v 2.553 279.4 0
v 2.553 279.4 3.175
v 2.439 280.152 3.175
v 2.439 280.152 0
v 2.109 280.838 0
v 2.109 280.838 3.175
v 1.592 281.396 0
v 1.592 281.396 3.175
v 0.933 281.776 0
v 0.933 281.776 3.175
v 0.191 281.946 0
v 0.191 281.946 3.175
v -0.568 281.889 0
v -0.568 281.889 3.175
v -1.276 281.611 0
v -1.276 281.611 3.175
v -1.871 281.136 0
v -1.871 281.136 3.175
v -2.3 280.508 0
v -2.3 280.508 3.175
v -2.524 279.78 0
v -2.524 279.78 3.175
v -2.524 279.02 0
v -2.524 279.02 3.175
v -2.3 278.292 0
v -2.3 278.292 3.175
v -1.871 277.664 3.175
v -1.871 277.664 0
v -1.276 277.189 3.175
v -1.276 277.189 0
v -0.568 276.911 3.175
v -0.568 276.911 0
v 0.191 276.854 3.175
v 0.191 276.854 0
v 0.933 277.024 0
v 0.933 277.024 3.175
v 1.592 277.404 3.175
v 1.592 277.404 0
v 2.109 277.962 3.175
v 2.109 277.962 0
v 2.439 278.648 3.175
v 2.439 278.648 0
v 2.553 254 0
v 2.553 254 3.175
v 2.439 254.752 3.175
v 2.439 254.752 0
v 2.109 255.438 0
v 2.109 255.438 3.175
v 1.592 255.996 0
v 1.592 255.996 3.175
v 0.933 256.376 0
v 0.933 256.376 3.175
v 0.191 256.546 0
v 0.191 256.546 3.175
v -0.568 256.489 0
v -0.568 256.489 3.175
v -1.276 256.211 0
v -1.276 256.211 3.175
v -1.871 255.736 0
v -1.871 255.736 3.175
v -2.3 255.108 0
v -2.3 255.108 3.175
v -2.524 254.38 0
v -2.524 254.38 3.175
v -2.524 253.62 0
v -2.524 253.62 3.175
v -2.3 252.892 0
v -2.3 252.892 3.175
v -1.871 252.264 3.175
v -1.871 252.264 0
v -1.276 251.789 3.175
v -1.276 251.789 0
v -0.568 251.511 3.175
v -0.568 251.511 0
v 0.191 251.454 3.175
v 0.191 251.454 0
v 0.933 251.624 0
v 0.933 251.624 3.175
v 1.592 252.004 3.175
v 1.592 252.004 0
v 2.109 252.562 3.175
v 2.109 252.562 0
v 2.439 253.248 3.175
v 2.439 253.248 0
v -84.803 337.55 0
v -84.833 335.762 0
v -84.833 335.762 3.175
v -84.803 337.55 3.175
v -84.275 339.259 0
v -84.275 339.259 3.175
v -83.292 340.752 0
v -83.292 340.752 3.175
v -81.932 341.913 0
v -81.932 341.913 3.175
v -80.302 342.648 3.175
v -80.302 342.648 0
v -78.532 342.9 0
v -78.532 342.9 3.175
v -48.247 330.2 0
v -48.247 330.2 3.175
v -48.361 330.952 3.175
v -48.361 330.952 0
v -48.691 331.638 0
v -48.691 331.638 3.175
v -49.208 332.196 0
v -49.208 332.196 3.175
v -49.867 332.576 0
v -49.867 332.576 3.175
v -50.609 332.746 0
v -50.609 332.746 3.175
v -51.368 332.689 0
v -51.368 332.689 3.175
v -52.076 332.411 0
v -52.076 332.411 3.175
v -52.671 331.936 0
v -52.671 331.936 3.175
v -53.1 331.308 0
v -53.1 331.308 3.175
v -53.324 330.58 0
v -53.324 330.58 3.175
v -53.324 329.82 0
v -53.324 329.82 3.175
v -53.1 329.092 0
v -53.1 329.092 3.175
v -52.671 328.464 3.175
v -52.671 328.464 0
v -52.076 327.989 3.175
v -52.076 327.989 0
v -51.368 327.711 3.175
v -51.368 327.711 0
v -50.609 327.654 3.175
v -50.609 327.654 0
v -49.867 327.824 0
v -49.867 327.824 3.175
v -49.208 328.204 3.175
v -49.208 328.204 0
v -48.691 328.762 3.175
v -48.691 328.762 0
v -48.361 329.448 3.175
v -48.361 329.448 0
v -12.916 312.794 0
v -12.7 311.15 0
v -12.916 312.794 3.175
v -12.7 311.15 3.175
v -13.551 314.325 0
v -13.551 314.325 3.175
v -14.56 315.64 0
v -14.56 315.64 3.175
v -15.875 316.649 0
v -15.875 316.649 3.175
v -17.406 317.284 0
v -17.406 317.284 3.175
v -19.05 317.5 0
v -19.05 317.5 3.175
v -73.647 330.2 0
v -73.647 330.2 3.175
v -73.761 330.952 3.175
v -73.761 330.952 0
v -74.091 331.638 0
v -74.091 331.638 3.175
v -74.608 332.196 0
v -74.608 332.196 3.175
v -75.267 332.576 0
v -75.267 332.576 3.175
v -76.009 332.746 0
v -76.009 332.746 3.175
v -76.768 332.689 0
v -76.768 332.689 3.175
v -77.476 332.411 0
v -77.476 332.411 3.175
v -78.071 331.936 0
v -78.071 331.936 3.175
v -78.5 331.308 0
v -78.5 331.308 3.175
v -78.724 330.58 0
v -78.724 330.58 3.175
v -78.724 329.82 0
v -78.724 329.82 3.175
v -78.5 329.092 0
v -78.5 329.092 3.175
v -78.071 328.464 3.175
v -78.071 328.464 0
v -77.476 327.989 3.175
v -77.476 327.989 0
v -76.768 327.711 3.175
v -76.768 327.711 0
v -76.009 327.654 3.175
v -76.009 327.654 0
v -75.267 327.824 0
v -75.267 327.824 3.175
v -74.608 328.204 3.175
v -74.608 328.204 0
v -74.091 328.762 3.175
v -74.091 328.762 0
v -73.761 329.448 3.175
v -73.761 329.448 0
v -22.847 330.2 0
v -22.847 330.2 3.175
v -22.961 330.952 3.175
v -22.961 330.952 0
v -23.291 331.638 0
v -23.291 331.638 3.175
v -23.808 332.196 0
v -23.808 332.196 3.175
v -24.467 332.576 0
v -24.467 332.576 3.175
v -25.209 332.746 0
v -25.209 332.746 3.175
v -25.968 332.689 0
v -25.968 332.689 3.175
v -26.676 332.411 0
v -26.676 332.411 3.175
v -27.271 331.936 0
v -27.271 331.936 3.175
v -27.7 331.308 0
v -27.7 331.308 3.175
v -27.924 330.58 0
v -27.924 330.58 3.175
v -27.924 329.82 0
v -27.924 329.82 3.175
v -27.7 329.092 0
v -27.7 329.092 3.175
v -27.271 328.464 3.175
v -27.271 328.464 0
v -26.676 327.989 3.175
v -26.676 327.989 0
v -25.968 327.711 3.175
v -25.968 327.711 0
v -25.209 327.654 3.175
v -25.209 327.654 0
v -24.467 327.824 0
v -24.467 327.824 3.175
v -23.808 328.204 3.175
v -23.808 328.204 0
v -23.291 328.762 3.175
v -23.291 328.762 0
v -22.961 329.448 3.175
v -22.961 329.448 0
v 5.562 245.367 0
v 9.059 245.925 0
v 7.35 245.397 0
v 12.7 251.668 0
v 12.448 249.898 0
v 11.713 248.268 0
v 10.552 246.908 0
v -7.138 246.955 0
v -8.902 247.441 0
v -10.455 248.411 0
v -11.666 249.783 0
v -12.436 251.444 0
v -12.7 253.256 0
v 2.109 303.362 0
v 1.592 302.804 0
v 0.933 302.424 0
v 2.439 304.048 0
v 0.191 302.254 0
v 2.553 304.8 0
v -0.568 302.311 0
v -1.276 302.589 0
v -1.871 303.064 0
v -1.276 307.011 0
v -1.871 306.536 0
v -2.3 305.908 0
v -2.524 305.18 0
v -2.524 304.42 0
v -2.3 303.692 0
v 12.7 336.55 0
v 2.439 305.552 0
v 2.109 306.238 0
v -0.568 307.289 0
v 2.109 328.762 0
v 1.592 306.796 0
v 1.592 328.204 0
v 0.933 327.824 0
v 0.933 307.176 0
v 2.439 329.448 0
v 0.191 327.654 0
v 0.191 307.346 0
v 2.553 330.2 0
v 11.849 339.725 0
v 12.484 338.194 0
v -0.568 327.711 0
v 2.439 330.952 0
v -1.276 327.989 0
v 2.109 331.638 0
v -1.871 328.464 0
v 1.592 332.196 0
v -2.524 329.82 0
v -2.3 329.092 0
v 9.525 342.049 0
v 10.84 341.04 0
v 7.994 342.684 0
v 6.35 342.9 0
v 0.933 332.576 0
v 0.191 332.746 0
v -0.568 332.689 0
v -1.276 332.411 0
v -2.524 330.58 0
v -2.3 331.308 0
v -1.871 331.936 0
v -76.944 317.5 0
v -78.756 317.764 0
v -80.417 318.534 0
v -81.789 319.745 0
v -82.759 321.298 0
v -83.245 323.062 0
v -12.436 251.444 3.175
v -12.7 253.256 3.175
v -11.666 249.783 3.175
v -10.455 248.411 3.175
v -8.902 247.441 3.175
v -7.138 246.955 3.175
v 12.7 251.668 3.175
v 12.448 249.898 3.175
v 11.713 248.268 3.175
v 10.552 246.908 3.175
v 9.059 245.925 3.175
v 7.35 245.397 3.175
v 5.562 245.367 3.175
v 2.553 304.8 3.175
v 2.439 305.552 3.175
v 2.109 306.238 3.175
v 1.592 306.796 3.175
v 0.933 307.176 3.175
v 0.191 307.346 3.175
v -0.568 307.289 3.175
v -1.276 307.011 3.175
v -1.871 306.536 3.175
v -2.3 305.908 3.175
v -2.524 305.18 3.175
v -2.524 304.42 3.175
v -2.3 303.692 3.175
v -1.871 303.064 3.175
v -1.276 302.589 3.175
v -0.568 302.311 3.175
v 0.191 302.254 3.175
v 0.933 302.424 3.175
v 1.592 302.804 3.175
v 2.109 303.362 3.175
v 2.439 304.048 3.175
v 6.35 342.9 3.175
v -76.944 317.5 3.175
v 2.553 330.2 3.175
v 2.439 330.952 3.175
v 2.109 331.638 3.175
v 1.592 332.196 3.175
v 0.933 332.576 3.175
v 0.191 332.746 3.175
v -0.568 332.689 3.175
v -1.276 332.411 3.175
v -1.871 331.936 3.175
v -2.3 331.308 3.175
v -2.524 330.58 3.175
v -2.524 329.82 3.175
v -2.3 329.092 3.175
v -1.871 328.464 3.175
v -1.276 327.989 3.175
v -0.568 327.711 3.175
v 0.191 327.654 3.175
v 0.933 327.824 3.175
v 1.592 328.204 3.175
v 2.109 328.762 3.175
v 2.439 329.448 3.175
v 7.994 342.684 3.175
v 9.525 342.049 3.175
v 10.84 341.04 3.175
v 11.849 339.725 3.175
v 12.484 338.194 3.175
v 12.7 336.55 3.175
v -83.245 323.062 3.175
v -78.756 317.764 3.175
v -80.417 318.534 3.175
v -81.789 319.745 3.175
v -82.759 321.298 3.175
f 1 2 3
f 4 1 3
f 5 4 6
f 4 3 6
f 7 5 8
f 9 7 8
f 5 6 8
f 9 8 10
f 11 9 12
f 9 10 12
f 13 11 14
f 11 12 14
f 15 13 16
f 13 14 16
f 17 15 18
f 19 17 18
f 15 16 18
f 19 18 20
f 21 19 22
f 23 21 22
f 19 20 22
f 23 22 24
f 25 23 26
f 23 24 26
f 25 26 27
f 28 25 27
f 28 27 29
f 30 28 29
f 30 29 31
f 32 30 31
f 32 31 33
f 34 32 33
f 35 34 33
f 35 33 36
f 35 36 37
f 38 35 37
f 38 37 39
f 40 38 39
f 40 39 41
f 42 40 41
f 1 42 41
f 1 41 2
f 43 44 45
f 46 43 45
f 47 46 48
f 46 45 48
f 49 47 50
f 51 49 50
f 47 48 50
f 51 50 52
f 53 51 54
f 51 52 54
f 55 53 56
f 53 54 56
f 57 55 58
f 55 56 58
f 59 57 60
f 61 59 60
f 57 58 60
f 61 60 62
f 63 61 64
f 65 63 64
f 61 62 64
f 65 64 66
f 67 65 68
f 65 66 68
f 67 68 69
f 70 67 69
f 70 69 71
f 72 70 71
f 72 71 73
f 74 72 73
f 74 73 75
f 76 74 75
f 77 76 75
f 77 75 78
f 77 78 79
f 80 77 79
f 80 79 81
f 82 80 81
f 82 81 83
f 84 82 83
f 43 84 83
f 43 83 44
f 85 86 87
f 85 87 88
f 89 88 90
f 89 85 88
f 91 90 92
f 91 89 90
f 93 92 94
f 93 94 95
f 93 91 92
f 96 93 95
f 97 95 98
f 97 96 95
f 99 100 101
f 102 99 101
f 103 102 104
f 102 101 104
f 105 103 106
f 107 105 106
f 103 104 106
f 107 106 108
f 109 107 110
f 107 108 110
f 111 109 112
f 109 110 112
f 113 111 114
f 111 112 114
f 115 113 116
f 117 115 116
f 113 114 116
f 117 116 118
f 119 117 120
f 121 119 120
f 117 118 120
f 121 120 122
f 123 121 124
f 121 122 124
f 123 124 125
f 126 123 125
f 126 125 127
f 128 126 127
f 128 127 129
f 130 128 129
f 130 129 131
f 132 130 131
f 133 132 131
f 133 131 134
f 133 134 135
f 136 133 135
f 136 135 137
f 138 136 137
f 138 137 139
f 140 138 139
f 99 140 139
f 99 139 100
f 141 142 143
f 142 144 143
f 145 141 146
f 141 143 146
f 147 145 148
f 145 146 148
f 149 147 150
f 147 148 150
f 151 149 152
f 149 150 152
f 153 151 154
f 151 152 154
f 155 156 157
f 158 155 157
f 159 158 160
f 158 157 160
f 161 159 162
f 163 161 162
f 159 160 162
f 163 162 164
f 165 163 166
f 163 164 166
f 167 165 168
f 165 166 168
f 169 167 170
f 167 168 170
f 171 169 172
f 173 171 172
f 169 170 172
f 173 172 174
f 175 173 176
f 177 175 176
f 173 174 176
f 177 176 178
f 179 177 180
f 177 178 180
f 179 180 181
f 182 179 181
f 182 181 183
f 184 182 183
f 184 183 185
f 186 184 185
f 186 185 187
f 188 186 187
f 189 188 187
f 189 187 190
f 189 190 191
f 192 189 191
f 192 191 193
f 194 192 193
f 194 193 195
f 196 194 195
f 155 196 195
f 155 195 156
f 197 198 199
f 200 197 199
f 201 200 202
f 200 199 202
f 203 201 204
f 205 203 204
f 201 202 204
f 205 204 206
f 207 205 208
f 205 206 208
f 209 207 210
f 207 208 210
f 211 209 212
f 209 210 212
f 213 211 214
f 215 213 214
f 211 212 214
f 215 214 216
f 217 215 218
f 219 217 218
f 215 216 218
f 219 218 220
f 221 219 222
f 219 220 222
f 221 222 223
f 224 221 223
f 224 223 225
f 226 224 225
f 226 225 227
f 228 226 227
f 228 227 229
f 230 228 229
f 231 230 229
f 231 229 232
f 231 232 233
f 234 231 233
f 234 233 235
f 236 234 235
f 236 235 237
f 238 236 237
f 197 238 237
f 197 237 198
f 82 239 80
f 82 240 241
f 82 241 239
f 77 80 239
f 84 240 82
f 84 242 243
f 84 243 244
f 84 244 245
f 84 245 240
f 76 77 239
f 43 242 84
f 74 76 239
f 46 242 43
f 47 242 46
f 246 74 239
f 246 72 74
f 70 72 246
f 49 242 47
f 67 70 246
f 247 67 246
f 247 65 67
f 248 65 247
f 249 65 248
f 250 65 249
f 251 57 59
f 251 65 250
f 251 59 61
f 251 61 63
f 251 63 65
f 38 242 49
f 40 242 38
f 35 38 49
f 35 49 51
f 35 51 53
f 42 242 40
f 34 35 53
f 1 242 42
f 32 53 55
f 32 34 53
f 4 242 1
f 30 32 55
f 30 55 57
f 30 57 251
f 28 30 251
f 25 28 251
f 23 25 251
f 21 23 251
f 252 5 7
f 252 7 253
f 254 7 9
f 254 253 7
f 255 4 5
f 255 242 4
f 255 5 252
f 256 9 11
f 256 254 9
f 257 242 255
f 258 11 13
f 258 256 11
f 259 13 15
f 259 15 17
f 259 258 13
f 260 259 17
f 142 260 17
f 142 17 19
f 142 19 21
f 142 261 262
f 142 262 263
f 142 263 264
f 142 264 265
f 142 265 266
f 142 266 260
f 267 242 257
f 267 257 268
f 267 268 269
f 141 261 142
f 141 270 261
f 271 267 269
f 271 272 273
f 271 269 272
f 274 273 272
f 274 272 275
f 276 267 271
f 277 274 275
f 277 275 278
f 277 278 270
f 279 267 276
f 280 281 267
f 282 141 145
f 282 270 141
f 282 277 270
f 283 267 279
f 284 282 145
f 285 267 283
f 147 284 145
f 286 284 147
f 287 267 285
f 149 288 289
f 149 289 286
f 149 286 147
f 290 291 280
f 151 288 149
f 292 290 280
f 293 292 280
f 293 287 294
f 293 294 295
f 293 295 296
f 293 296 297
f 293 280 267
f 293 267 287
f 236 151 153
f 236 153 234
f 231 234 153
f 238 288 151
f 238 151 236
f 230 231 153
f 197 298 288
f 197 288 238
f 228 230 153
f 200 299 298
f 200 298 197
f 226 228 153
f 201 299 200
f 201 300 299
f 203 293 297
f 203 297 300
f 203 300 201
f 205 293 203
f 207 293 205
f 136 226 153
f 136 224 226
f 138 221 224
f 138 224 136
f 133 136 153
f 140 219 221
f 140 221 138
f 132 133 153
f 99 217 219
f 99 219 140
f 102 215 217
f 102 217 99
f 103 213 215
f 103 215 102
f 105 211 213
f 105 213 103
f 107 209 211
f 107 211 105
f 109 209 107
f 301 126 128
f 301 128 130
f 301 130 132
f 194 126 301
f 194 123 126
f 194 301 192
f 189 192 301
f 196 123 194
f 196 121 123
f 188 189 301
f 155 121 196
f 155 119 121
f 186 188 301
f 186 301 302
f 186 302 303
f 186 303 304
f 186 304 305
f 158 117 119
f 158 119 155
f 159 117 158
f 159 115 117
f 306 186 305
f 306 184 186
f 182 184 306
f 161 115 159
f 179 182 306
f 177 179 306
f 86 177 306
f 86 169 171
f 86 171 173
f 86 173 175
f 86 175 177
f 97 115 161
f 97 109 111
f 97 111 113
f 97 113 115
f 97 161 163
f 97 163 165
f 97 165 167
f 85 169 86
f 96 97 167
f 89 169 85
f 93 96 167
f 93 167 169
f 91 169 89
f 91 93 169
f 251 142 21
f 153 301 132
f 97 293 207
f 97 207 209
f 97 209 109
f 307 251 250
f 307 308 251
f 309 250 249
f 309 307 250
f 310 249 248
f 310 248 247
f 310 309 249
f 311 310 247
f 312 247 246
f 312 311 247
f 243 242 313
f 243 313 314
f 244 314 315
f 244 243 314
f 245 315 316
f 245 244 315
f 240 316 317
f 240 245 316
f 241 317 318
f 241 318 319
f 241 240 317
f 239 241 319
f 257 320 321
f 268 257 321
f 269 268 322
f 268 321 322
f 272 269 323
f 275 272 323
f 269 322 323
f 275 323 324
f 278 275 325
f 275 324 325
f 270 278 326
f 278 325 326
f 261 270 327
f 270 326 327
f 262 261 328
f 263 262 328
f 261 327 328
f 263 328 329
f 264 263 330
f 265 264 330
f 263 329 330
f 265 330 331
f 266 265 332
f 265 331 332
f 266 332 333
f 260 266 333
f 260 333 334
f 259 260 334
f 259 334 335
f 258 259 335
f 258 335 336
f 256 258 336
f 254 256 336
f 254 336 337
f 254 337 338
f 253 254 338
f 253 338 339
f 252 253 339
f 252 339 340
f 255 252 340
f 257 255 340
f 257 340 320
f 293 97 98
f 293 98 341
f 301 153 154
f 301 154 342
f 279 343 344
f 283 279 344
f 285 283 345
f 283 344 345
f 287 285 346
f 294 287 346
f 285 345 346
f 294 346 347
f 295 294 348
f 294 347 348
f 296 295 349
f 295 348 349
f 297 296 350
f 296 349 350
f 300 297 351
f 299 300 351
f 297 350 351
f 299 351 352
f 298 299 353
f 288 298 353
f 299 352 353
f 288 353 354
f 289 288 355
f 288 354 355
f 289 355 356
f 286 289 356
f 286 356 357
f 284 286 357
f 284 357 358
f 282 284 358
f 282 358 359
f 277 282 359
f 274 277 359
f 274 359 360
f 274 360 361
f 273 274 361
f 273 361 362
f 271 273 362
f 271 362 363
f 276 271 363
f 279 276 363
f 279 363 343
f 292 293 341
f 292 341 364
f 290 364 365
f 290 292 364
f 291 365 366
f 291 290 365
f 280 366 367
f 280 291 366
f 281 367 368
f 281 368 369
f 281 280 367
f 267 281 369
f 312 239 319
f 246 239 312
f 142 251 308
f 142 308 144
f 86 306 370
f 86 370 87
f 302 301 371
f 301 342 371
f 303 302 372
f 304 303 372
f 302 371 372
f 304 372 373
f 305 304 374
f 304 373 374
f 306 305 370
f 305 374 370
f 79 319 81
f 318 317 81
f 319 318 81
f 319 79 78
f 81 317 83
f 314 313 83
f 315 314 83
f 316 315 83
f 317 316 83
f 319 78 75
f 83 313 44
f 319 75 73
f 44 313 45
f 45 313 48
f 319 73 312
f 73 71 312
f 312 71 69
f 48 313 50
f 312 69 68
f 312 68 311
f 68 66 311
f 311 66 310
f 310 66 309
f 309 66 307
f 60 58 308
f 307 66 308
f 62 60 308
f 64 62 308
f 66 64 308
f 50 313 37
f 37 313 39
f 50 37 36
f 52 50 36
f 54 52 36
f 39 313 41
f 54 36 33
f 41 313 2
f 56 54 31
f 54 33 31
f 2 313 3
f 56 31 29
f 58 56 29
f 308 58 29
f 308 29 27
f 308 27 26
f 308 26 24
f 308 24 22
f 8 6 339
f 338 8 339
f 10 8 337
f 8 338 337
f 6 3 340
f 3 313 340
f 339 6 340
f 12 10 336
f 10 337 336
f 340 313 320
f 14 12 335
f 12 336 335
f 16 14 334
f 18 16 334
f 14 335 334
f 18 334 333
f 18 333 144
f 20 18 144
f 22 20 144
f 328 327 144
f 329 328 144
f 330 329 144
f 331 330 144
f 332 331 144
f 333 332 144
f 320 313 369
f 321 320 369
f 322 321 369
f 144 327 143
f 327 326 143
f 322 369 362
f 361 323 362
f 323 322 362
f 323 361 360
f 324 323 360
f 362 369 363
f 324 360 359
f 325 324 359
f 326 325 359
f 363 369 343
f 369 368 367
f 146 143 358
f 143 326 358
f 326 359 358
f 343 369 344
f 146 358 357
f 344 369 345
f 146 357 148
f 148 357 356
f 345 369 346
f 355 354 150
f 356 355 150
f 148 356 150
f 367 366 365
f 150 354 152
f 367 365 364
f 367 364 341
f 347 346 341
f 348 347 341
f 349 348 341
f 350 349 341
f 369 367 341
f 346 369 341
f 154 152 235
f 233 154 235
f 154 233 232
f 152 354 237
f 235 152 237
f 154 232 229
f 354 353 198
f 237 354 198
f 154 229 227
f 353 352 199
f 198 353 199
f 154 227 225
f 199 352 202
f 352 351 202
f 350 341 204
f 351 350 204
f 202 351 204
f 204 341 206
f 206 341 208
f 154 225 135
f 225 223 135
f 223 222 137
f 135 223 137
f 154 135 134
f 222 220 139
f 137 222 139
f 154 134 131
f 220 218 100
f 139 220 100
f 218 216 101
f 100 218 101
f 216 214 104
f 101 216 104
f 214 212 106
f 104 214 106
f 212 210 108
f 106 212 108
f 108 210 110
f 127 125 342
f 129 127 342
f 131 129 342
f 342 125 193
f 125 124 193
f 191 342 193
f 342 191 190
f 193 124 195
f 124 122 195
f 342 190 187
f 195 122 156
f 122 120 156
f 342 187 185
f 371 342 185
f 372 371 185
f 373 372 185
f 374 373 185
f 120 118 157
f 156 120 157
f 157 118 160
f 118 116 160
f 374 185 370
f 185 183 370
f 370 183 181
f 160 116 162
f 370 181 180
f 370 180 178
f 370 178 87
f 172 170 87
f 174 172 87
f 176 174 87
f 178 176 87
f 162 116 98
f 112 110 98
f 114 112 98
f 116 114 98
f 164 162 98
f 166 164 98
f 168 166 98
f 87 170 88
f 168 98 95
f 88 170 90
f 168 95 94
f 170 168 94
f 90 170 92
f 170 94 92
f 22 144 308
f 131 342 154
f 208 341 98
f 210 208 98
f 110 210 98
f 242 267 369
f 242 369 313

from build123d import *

# Parameters (mm, degrees)
BOSS_EXTRUDE1_DEPTH        = 3.175
FILLET1_R                  = 6.35
F_10_CLEARANCE_HOLE1_D     = 5.1054
F_10_CLEARANCE_HOLE1_DEPTH = 9.906
F_10_CLEARANCE_HOLE1_TIP   = 1.533816902


with BuildPart() as part:
    # Sketch1 → Boss-Extrude1 (new body)
    with BuildSketch(Plane.XY):
        with BuildLine():
            Line((-12.7, 247.65), (-12.7, 317.5))
            Line((-12.7, 317.5), (-82.55, 317.5))
            Line((-82.55, 317.5), (-84.832797429, 335.762379435))
            ThreePointArc((-84.832797429, 335.762379435), (-83.292289329, 340.752446277), (-78.531832912, 342.9))
            Line((-78.531832912, 342.9), (6.35, 342.9))
            ThreePointArc((6.35, 342.9), (10.840128061, 341.040128061), (12.7, 336.55))
            Line((12.7, 336.55), (12.7, 251.668167088))
            ThreePointArc((12.7, 251.668167088), (10.552446277, 246.907710671), (5.562379435, 245.367202571))
            Line((5.562379435, 245.367202571), (-12.7, 247.65))
        make_face()
    extrude(amount=BOSS_EXTRUDE1_DEPTH)

    # Fillet1
    fillet1_edges = [part.edges().sort_by_distance(p)[0] for p in [
        (-12.7, 247.65, 1.5875),
        (-12.7, 317.5, 1.5875),
        (-82.55, 317.5, 1.5875),
    ]]
    fillet(fillet1_edges, radius=FILLET1_R)

    # #10 Clearance Hole1
    with Locations(Plane(origin=(0, 0, 0), x_dir=(-1, 0, 0), z_dir=(0, 0, -1))):
        with Locations((0, 330.2), (0, 304.8), (0, 279.4), (25.4, 330.2), (0, 254), (50.8, 330.2), (76.2, 330.2)):
            Hole(F_10_CLEARANCE_HOLE1_D / 2, depth=F_10_CLEARANCE_HOLE1_DEPTH)
            with Locations((0, 0, -(F_10_CLEARANCE_HOLE1_DEPTH + F_10_CLEARANCE_HOLE1_TIP / 2))):  # 118° drill point
                Cone(0, F_10_CLEARANCE_HOLE1_D / 2, F_10_CLEARANCE_HOLE1_TIP, mode=Mode.SUBTRACT)


solid = part.part
